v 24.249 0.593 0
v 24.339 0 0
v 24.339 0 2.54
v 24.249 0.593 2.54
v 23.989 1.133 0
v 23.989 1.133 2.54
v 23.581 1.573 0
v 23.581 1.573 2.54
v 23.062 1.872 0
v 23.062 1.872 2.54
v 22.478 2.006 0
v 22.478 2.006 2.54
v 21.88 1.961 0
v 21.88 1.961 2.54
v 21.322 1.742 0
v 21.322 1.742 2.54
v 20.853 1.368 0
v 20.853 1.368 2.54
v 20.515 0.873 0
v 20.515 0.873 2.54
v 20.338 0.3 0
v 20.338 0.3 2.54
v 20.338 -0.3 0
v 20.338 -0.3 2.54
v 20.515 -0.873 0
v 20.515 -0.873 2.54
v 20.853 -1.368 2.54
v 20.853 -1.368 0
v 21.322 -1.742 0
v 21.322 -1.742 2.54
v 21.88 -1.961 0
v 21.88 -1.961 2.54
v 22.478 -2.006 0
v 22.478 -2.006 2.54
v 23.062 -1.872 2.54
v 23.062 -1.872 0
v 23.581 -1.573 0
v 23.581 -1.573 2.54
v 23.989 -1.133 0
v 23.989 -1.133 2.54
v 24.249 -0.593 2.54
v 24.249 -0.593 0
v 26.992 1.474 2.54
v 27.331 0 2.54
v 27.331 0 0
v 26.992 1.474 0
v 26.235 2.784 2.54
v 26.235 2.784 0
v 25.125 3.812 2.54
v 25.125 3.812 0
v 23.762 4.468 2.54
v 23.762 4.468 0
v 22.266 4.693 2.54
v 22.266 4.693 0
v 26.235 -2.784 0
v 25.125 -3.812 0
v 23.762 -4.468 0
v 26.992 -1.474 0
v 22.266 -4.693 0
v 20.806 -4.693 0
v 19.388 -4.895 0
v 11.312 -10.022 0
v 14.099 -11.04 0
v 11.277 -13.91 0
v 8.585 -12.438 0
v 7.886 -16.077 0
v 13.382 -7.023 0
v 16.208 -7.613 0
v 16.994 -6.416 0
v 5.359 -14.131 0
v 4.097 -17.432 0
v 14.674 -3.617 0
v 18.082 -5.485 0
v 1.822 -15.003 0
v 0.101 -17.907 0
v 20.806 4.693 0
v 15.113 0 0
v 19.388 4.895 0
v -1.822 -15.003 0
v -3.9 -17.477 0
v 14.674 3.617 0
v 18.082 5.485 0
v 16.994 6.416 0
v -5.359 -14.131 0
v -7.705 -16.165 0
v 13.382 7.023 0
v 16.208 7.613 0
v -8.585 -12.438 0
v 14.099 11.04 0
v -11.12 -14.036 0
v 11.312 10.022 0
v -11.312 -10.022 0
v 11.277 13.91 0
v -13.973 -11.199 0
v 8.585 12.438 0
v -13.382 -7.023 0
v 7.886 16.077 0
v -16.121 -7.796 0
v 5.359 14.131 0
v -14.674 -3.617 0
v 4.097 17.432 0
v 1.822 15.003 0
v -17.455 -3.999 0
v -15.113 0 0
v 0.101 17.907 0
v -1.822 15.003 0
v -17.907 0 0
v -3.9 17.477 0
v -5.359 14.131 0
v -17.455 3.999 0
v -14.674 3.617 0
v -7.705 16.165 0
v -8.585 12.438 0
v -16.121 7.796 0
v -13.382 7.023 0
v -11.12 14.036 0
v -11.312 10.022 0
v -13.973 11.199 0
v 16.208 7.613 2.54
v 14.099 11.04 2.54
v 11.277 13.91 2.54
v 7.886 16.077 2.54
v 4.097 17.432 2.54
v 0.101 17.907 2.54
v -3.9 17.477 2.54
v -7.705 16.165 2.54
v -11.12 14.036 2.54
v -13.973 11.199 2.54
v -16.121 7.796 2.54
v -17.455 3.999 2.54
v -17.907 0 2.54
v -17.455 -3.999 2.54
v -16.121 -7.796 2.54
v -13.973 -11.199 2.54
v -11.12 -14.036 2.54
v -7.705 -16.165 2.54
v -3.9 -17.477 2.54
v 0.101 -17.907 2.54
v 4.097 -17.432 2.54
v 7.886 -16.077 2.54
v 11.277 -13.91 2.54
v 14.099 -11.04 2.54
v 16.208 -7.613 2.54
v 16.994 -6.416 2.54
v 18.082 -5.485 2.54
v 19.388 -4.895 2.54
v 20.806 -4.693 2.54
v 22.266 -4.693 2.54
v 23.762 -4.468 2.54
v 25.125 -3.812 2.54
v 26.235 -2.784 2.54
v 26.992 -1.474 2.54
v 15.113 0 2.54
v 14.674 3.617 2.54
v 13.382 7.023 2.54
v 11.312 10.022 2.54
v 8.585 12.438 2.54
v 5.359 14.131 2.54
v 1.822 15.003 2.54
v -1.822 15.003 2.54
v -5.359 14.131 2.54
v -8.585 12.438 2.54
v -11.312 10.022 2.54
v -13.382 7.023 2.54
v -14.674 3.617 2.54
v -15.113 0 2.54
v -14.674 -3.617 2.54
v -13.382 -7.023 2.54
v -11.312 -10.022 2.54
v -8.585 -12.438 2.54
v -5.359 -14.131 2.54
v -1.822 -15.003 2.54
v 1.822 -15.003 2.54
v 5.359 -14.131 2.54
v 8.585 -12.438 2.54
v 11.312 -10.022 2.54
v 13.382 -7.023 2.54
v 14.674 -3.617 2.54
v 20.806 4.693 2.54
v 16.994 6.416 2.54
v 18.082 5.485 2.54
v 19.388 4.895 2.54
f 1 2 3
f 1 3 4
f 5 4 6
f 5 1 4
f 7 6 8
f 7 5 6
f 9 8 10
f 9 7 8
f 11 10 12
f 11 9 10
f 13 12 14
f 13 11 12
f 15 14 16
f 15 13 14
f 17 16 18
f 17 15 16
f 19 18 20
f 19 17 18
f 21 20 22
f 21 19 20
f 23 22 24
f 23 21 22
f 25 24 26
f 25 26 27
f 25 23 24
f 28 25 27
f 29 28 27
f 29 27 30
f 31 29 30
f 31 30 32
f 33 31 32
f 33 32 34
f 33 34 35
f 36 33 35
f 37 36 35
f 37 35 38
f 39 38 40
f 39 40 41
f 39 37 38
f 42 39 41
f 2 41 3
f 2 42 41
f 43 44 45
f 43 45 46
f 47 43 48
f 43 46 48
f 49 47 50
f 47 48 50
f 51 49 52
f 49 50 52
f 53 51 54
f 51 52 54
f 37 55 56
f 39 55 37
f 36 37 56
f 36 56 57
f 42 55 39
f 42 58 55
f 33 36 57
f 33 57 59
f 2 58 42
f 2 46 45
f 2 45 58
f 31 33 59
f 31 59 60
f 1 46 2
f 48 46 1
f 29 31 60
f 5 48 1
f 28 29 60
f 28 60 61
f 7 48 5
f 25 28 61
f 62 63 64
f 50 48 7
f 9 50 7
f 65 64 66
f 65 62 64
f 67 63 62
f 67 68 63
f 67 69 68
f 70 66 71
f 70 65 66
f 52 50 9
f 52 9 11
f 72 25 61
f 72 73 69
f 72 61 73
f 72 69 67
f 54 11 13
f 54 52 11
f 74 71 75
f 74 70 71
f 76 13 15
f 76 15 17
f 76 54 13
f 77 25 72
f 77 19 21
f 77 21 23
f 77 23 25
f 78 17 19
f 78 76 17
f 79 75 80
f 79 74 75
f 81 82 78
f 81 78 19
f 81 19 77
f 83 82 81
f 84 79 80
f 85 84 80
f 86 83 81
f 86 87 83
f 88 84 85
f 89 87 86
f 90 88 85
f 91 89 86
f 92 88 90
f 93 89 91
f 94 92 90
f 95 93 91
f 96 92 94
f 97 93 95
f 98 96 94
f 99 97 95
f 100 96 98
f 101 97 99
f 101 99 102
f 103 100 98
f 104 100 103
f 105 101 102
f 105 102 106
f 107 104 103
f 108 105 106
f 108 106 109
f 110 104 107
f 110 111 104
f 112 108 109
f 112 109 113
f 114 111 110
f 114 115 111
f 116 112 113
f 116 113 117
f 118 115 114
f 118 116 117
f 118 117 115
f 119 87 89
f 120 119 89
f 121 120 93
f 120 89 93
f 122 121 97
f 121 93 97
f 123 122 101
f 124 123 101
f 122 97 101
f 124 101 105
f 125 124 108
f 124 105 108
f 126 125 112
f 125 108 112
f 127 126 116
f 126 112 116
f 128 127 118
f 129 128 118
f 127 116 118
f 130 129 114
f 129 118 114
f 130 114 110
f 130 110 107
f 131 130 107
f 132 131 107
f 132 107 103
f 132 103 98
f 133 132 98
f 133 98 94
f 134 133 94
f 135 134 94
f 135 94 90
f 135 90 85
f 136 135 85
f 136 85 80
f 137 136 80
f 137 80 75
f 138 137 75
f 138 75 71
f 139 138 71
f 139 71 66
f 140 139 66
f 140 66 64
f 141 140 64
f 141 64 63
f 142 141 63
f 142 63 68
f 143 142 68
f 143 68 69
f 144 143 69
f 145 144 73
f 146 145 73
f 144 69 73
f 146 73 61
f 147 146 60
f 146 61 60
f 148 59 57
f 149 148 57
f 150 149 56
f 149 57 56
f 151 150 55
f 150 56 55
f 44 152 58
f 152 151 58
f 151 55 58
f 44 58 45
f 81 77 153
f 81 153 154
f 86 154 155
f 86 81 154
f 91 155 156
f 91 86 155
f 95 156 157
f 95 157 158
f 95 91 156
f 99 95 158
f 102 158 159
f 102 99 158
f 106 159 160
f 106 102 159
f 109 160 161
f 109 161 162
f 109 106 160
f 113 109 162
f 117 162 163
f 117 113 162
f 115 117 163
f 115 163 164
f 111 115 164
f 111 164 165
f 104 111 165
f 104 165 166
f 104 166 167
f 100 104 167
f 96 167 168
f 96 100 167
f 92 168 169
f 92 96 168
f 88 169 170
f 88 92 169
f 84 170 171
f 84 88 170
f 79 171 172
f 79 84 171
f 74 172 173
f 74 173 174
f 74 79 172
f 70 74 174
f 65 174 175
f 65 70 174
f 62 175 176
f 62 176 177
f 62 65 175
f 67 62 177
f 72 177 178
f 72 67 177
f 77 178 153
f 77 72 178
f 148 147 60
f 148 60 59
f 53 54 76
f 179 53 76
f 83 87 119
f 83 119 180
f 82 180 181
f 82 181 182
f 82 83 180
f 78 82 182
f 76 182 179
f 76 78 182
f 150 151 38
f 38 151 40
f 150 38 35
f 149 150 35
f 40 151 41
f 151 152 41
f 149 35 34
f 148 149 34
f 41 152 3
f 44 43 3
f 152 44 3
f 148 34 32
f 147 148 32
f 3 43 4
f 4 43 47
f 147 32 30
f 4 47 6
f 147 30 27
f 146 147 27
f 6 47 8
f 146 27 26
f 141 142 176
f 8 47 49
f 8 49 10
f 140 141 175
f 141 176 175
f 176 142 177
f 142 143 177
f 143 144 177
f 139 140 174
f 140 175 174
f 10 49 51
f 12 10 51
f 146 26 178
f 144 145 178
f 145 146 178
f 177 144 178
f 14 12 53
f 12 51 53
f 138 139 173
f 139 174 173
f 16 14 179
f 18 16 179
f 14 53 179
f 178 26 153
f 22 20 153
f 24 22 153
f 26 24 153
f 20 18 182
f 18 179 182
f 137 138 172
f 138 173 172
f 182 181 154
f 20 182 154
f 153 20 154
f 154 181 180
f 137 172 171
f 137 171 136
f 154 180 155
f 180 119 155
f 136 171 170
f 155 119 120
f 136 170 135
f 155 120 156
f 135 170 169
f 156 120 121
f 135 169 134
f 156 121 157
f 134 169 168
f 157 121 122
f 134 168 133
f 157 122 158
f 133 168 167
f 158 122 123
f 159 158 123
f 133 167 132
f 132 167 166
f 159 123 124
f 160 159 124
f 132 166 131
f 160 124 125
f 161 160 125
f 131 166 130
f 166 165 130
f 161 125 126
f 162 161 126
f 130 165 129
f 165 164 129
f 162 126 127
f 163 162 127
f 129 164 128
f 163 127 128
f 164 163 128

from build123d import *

# Parameters (mm, degrees)
F0_R        = 15.113
F0_R_2      = 2.0114491118
F1_DEPTH    = 2.54
F2_T1_DEPTH = 2.54
F2_T3_DEPTH = 27.94


# Not quite as in the source:
# - a fillet or chamfer that OpenCascade refuses, or shapes differently, is made with other operations: its cross-section is extruded or revolved along the edge and cut away or added


with BuildPart() as f1:
    # F0 (on Top) → F1 (new body)
    with BuildSketch(Plane.XY):
        with BuildLine():
            Line((27.3455847055, 4.693207435), (17.2810431679, 4.693207435))
            ThreePointArc((17.2810431679, 4.693207435), (-17.907, 0), (17.2810431679, -4.693207435))
            Line((17.2810431679, -4.693207435), (27.3455847055, -4.693207435))
            Line((27.3455847055, -4.693207435), (27.3455847055, 4.693207435))
        make_face()
        Circle(F0_R, mode=Mode.SUBTRACT)
        with Locations((22.3272647709, 0)):
            Circle(F0_R_2, mode=Mode.SUBTRACT)
    extrude(amount=F1_DEPTH)

    # F2: fillet of radius 5.08 on 4 edges, made by hand

    # F2_s2 → F2_t1 (join)
    with BuildSketch(Plane.XY):
        with BuildLine():
            ThreePointArc((16.2079318414, 7.6133825875), (18.0824647595, 5.4849496171), (20.8059266901, 4.693207435))
            Line((20.8059266901, 4.693207435), (17.2810431679, 4.693207435))
            ThreePointArc((17.2810431679, 4.693207435), (16.8080253904, 6.1766440301), (16.2079318414, 7.6133825875))
        make_face()
        with BuildLine():
            ThreePointArc((16.2079318414, -7.6133825875), (18.0824647595, -5.4849496171), (20.8059266901, -4.693207435))
            Line((20.8059266901, -4.693207435), (17.2810431679, -4.693207435))
            ThreePointArc((17.2810431679, -4.693207435), (16.8080253904, -6.1766440301), (16.2079318414, -7.6133825875))
        make_face()
    extrude(amount=F2_T1_DEPTH)

    # F2_s4 → F2_t3 (cut)
    with BuildSketch(Plane.XY.offset(-12.7)):
        with BuildLine():
            ThreePointArc((22.2655847055, -4.693207435), (25.8576871539, -3.2053098834), (27.3455847055, 0.386792565))
            Line((27.3455847055, 0.386792565), (27.3455847055, -4.693207435))
            Line((27.3455847055, -4.693207435), (22.2655847055, -4.693207435))
        make_face()
        with BuildLine():
            ThreePointArc((27.3455847055, -0.386792565), (25.8576871539, 3.2053098834), (22.2655847055, 4.693207435))
            Line((22.2655847055, 4.693207435), (27.3455847055, 4.693207435))
            Line((27.3455847055, 4.693207435), (27.3455847055, -0.386792565))
        make_face()
    extrude(amount=F2_T3_DEPTH, mode=Mode.SUBTRACT)


solid = f1.part
